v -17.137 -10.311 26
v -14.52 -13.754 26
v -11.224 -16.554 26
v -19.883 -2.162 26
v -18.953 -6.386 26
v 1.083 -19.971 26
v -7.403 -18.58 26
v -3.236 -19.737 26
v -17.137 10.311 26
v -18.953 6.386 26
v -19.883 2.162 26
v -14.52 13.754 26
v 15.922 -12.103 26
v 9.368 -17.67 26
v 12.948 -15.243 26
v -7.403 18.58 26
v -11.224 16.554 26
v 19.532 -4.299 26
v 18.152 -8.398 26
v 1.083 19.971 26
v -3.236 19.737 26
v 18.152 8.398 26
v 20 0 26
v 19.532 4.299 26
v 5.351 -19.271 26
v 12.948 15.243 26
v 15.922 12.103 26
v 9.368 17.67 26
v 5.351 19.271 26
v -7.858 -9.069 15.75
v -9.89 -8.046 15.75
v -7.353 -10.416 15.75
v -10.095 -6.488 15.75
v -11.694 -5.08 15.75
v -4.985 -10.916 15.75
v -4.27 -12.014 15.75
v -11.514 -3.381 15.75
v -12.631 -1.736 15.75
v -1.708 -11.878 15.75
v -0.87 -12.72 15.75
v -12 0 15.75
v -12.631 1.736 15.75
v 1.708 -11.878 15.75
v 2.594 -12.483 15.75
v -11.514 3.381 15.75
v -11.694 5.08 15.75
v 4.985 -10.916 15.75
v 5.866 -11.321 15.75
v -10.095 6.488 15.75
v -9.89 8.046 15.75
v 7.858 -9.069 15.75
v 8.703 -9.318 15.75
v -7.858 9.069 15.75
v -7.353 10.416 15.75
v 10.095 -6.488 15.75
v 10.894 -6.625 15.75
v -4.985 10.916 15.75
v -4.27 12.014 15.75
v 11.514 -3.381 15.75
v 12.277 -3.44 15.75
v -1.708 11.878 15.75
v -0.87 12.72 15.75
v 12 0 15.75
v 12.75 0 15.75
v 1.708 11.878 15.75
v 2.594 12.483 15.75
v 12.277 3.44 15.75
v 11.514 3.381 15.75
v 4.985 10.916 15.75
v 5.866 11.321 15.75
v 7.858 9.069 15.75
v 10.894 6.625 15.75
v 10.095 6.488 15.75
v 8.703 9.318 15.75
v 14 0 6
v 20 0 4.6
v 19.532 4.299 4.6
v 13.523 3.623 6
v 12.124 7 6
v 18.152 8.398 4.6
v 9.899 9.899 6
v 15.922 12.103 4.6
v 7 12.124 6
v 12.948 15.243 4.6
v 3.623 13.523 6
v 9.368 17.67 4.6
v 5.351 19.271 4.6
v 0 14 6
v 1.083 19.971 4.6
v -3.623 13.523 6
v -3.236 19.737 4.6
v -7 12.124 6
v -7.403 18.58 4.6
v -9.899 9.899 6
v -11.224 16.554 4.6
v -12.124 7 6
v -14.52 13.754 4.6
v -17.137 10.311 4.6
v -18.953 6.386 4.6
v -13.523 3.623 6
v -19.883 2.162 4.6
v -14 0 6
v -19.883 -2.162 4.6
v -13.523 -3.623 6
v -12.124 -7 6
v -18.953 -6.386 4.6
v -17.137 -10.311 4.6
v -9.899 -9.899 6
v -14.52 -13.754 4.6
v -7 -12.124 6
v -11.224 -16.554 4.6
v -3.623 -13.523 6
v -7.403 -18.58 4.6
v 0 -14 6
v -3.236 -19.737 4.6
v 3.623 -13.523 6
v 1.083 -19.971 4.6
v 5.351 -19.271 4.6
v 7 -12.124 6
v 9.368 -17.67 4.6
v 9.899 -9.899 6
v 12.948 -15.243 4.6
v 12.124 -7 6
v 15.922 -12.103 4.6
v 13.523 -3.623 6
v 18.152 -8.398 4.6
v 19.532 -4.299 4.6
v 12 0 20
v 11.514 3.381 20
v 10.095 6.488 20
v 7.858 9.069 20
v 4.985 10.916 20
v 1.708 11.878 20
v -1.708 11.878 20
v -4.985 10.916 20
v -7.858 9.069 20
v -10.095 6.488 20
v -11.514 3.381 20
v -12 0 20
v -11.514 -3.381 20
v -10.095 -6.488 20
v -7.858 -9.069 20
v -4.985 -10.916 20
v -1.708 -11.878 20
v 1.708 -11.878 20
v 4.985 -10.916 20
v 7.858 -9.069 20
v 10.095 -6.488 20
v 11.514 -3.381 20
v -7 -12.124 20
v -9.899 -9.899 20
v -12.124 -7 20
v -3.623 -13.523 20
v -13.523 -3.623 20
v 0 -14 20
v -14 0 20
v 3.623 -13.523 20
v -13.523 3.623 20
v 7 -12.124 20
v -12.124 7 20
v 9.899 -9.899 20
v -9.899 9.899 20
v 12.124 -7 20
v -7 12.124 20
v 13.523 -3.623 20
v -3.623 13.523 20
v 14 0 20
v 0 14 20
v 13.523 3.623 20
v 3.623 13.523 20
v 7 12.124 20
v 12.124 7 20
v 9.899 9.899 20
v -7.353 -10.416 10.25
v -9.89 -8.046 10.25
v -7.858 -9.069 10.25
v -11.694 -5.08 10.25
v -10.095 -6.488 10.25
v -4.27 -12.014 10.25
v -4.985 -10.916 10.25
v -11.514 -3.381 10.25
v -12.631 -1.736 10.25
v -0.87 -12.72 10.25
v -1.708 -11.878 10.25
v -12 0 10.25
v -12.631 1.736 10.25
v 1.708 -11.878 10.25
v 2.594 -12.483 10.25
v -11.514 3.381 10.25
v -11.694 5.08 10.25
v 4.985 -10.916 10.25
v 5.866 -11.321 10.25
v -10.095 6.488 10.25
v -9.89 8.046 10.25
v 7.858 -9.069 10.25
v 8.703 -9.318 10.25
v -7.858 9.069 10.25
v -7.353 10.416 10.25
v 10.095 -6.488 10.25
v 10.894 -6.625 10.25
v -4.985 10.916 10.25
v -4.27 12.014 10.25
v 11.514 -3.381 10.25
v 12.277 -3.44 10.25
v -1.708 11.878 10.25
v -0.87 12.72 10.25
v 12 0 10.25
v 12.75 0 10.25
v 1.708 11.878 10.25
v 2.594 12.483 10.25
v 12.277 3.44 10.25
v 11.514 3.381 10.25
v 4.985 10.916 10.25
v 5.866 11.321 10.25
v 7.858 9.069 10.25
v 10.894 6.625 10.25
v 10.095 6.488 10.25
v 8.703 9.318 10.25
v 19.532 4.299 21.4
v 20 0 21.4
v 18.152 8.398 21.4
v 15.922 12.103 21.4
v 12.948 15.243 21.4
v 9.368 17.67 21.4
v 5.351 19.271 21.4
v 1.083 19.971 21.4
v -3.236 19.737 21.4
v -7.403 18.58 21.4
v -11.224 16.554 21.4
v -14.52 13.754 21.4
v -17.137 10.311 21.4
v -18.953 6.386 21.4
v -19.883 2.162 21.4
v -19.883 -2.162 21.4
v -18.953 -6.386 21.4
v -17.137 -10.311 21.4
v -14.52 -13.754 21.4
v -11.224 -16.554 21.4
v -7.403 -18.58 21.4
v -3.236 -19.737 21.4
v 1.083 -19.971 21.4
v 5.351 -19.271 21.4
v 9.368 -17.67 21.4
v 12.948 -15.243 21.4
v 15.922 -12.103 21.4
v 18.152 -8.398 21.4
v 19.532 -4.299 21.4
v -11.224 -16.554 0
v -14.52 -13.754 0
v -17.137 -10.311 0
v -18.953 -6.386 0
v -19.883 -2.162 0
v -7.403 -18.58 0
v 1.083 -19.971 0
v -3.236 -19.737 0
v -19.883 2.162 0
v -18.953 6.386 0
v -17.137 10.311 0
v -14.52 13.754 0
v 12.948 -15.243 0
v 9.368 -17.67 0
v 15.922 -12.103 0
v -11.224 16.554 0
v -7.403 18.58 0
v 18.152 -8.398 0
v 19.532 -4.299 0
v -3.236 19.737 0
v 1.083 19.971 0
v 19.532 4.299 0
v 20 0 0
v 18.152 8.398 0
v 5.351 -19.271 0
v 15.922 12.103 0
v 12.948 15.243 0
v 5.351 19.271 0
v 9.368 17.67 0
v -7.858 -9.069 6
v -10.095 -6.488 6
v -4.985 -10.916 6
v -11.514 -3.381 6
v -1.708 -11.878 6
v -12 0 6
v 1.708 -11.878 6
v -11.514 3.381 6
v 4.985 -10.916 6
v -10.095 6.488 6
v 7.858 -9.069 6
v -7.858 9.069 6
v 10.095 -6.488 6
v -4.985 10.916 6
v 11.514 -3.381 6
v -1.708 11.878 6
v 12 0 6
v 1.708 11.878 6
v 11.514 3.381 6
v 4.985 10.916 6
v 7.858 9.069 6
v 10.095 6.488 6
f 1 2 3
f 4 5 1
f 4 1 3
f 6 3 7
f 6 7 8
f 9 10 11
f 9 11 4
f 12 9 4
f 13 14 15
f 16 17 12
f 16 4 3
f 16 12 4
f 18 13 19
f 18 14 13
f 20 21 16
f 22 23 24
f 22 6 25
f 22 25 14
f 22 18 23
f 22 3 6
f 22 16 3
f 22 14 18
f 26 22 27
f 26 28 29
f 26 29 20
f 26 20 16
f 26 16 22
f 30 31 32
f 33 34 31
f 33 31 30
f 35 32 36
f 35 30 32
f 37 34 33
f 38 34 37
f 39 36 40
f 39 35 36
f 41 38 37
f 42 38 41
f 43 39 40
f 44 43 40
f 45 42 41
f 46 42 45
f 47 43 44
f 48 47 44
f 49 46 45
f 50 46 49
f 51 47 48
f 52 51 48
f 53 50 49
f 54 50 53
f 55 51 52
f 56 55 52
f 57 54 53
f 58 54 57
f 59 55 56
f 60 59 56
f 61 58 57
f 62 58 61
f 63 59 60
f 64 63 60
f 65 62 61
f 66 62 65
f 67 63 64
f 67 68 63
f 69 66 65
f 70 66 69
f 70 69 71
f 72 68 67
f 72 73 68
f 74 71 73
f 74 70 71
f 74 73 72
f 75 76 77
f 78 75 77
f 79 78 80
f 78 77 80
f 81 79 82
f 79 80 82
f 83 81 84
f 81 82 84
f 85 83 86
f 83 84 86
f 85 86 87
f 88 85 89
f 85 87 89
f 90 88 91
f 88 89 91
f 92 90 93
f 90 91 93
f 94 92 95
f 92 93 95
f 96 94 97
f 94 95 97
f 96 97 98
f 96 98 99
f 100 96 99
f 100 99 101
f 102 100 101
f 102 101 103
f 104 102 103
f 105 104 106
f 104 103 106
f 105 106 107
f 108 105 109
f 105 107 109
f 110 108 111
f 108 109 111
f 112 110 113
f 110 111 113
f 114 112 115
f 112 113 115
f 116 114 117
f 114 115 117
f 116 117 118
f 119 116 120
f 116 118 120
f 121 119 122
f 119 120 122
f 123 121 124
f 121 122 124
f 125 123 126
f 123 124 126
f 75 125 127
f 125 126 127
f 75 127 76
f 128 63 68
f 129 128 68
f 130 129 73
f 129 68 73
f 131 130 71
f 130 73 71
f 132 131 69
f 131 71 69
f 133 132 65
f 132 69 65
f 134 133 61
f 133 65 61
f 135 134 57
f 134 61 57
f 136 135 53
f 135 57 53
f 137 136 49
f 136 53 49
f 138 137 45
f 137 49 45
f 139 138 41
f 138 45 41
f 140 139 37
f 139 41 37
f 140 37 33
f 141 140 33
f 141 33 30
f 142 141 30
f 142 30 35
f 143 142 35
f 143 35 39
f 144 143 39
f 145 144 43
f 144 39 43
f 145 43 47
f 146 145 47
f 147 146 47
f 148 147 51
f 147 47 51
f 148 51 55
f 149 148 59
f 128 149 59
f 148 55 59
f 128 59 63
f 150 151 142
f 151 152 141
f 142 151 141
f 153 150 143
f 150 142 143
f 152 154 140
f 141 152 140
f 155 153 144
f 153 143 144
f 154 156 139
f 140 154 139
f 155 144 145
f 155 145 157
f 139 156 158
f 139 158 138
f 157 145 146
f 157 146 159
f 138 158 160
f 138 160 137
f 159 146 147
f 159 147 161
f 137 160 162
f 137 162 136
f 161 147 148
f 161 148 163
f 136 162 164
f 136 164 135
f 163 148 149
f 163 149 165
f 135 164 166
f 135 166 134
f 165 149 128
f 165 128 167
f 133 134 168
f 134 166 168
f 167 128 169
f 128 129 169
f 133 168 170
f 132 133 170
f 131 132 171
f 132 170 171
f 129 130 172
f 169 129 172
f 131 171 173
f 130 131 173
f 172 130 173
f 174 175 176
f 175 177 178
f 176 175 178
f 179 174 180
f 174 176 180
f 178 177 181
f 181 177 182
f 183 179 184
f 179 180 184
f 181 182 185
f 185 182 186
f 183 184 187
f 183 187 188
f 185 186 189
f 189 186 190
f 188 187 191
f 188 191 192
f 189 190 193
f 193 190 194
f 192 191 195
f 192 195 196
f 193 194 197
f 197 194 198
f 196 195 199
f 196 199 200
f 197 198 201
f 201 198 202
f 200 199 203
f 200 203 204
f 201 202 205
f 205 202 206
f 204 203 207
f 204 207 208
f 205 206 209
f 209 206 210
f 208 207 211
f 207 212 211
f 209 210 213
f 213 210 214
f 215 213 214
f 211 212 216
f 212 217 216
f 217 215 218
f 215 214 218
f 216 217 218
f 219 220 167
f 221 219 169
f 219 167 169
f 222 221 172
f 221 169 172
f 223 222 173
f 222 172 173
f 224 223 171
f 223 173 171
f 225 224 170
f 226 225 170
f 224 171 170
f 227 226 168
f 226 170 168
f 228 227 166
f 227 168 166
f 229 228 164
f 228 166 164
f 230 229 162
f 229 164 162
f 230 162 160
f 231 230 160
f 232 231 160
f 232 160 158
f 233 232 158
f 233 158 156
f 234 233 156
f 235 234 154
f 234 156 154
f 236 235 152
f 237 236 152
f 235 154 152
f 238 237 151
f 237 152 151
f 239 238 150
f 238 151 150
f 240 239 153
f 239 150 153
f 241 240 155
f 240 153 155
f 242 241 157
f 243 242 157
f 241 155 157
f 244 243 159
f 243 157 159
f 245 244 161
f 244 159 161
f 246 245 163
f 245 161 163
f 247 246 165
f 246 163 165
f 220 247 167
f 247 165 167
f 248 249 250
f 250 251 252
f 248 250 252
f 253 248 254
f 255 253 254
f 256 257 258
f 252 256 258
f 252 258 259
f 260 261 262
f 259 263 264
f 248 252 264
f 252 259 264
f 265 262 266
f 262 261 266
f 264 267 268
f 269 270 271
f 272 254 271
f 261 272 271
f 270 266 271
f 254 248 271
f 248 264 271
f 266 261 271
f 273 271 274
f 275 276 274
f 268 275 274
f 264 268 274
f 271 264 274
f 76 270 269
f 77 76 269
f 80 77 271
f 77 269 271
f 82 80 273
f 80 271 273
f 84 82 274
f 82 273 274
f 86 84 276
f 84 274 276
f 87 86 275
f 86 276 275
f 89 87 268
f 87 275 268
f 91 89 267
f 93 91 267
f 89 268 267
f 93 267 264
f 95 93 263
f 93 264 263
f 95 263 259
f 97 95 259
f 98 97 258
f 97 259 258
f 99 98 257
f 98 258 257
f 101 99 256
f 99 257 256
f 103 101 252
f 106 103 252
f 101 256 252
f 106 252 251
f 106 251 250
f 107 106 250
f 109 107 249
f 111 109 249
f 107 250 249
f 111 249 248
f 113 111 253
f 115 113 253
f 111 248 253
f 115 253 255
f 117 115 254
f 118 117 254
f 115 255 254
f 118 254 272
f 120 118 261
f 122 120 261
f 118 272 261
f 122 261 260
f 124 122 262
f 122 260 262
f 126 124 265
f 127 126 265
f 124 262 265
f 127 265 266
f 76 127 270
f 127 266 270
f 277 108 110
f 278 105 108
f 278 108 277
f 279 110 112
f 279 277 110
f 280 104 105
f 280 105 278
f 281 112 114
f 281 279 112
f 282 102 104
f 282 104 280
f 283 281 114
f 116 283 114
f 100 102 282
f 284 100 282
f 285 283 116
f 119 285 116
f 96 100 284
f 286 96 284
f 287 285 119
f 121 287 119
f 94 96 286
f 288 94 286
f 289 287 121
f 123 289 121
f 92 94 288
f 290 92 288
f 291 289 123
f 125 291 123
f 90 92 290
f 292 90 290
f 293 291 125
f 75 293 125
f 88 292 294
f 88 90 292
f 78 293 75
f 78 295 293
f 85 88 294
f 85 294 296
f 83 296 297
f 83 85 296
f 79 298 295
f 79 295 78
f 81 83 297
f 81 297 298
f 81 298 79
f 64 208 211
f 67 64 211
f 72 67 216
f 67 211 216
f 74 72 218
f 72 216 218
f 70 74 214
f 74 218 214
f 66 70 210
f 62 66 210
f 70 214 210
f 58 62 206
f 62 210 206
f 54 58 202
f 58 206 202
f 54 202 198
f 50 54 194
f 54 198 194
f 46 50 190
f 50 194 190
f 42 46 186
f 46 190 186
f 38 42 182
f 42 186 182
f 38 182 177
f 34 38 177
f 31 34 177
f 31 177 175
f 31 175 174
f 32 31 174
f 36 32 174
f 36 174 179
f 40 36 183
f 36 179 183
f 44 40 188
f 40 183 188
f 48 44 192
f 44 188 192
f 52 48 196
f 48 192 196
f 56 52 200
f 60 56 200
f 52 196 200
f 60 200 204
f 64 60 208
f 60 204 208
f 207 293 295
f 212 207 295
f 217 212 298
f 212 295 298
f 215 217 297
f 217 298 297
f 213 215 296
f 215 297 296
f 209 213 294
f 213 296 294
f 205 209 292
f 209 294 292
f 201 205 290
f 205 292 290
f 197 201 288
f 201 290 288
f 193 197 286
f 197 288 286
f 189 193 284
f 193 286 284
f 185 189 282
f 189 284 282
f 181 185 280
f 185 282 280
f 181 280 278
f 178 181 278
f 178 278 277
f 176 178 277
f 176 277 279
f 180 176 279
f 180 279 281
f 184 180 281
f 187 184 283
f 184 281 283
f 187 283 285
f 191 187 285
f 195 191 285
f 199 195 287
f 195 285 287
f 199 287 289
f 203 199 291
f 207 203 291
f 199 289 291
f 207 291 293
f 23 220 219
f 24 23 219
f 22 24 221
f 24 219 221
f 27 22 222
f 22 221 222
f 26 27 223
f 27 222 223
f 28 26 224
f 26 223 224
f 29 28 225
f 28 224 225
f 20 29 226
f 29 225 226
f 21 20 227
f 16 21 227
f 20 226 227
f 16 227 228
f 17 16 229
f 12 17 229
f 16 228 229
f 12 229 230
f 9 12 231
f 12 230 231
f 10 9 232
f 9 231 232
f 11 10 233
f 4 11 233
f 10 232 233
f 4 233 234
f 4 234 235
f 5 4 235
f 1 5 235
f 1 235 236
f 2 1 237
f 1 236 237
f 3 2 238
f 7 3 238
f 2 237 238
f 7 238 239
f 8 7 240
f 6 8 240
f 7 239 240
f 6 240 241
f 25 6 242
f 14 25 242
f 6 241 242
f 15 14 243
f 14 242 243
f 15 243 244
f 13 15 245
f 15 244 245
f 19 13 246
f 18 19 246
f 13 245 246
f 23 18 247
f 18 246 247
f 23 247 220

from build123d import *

# Parameters (mm, degrees)
F0_R      = 20
F1_DEPTH  = 6
F3_R      = 12
F4_DEPTH  = 4.25
F6_R      = 12.75
F7_DEPTH  = 5.5
F9_R      = 12
F10_DEPTH = 4.25
F12_R     = 20
F13_DEPTH = 6
F14_SIZE2 = 1.4
F14_SIZE  = 6
F15_SIZE2 = 6
F15_SIZE  = 1.4


with BuildPart() as f1:
    # F0 (on Top) → F1 (new body)
    with BuildSketch(Plane.XY):
        Circle(F0_R)
    extrude(amount=F1_DEPTH)

    # F3 (on offset) → F4 (join)
    with BuildSketch(Plane.XY.offset(6)):
        Circle(F3_R)
    extrude(amount=F4_DEPTH)

    # F6 (on offset) → F7 (join)
    with BuildSketch(Plane.XY.offset(10.25)):
        Circle(F6_R)
    extrude(amount=F7_DEPTH)

    # F9 (on offset) → F10 (join)
    with BuildSketch(Plane.XY.offset(15.75)):
        Circle(F9_R)
    extrude(amount=F10_DEPTH)

    # F12 (on offset) → F13 (join)
    with BuildSketch(Plane.XY.offset(20)):
        Circle(F12_R)
    extrude(amount=F13_DEPTH)

    # F14
    f14_edges = [f1.edges().sort_by_distance(p)[0] for p in [
        (-20, 0, 6),
    ]]
    f14_side = f1.faces().sort_by_distance((-19.434315, 0, 6))[0]
    chamfer(f14_edges, length=F14_SIZE, length2=F14_SIZE2, reference=f14_side)

    # F15
    f15_edges = [f1.edges().sort_by_distance(p)[0] for p in [
        (-20, 0, 20),
    ]]
    f15_side = f1.faces().sort_by_distance((-20, 0, 23))[0]
    chamfer(f15_edges, length=F15_SIZE, length2=F15_SIZE2, reference=f15_side)


solid = f1.part
